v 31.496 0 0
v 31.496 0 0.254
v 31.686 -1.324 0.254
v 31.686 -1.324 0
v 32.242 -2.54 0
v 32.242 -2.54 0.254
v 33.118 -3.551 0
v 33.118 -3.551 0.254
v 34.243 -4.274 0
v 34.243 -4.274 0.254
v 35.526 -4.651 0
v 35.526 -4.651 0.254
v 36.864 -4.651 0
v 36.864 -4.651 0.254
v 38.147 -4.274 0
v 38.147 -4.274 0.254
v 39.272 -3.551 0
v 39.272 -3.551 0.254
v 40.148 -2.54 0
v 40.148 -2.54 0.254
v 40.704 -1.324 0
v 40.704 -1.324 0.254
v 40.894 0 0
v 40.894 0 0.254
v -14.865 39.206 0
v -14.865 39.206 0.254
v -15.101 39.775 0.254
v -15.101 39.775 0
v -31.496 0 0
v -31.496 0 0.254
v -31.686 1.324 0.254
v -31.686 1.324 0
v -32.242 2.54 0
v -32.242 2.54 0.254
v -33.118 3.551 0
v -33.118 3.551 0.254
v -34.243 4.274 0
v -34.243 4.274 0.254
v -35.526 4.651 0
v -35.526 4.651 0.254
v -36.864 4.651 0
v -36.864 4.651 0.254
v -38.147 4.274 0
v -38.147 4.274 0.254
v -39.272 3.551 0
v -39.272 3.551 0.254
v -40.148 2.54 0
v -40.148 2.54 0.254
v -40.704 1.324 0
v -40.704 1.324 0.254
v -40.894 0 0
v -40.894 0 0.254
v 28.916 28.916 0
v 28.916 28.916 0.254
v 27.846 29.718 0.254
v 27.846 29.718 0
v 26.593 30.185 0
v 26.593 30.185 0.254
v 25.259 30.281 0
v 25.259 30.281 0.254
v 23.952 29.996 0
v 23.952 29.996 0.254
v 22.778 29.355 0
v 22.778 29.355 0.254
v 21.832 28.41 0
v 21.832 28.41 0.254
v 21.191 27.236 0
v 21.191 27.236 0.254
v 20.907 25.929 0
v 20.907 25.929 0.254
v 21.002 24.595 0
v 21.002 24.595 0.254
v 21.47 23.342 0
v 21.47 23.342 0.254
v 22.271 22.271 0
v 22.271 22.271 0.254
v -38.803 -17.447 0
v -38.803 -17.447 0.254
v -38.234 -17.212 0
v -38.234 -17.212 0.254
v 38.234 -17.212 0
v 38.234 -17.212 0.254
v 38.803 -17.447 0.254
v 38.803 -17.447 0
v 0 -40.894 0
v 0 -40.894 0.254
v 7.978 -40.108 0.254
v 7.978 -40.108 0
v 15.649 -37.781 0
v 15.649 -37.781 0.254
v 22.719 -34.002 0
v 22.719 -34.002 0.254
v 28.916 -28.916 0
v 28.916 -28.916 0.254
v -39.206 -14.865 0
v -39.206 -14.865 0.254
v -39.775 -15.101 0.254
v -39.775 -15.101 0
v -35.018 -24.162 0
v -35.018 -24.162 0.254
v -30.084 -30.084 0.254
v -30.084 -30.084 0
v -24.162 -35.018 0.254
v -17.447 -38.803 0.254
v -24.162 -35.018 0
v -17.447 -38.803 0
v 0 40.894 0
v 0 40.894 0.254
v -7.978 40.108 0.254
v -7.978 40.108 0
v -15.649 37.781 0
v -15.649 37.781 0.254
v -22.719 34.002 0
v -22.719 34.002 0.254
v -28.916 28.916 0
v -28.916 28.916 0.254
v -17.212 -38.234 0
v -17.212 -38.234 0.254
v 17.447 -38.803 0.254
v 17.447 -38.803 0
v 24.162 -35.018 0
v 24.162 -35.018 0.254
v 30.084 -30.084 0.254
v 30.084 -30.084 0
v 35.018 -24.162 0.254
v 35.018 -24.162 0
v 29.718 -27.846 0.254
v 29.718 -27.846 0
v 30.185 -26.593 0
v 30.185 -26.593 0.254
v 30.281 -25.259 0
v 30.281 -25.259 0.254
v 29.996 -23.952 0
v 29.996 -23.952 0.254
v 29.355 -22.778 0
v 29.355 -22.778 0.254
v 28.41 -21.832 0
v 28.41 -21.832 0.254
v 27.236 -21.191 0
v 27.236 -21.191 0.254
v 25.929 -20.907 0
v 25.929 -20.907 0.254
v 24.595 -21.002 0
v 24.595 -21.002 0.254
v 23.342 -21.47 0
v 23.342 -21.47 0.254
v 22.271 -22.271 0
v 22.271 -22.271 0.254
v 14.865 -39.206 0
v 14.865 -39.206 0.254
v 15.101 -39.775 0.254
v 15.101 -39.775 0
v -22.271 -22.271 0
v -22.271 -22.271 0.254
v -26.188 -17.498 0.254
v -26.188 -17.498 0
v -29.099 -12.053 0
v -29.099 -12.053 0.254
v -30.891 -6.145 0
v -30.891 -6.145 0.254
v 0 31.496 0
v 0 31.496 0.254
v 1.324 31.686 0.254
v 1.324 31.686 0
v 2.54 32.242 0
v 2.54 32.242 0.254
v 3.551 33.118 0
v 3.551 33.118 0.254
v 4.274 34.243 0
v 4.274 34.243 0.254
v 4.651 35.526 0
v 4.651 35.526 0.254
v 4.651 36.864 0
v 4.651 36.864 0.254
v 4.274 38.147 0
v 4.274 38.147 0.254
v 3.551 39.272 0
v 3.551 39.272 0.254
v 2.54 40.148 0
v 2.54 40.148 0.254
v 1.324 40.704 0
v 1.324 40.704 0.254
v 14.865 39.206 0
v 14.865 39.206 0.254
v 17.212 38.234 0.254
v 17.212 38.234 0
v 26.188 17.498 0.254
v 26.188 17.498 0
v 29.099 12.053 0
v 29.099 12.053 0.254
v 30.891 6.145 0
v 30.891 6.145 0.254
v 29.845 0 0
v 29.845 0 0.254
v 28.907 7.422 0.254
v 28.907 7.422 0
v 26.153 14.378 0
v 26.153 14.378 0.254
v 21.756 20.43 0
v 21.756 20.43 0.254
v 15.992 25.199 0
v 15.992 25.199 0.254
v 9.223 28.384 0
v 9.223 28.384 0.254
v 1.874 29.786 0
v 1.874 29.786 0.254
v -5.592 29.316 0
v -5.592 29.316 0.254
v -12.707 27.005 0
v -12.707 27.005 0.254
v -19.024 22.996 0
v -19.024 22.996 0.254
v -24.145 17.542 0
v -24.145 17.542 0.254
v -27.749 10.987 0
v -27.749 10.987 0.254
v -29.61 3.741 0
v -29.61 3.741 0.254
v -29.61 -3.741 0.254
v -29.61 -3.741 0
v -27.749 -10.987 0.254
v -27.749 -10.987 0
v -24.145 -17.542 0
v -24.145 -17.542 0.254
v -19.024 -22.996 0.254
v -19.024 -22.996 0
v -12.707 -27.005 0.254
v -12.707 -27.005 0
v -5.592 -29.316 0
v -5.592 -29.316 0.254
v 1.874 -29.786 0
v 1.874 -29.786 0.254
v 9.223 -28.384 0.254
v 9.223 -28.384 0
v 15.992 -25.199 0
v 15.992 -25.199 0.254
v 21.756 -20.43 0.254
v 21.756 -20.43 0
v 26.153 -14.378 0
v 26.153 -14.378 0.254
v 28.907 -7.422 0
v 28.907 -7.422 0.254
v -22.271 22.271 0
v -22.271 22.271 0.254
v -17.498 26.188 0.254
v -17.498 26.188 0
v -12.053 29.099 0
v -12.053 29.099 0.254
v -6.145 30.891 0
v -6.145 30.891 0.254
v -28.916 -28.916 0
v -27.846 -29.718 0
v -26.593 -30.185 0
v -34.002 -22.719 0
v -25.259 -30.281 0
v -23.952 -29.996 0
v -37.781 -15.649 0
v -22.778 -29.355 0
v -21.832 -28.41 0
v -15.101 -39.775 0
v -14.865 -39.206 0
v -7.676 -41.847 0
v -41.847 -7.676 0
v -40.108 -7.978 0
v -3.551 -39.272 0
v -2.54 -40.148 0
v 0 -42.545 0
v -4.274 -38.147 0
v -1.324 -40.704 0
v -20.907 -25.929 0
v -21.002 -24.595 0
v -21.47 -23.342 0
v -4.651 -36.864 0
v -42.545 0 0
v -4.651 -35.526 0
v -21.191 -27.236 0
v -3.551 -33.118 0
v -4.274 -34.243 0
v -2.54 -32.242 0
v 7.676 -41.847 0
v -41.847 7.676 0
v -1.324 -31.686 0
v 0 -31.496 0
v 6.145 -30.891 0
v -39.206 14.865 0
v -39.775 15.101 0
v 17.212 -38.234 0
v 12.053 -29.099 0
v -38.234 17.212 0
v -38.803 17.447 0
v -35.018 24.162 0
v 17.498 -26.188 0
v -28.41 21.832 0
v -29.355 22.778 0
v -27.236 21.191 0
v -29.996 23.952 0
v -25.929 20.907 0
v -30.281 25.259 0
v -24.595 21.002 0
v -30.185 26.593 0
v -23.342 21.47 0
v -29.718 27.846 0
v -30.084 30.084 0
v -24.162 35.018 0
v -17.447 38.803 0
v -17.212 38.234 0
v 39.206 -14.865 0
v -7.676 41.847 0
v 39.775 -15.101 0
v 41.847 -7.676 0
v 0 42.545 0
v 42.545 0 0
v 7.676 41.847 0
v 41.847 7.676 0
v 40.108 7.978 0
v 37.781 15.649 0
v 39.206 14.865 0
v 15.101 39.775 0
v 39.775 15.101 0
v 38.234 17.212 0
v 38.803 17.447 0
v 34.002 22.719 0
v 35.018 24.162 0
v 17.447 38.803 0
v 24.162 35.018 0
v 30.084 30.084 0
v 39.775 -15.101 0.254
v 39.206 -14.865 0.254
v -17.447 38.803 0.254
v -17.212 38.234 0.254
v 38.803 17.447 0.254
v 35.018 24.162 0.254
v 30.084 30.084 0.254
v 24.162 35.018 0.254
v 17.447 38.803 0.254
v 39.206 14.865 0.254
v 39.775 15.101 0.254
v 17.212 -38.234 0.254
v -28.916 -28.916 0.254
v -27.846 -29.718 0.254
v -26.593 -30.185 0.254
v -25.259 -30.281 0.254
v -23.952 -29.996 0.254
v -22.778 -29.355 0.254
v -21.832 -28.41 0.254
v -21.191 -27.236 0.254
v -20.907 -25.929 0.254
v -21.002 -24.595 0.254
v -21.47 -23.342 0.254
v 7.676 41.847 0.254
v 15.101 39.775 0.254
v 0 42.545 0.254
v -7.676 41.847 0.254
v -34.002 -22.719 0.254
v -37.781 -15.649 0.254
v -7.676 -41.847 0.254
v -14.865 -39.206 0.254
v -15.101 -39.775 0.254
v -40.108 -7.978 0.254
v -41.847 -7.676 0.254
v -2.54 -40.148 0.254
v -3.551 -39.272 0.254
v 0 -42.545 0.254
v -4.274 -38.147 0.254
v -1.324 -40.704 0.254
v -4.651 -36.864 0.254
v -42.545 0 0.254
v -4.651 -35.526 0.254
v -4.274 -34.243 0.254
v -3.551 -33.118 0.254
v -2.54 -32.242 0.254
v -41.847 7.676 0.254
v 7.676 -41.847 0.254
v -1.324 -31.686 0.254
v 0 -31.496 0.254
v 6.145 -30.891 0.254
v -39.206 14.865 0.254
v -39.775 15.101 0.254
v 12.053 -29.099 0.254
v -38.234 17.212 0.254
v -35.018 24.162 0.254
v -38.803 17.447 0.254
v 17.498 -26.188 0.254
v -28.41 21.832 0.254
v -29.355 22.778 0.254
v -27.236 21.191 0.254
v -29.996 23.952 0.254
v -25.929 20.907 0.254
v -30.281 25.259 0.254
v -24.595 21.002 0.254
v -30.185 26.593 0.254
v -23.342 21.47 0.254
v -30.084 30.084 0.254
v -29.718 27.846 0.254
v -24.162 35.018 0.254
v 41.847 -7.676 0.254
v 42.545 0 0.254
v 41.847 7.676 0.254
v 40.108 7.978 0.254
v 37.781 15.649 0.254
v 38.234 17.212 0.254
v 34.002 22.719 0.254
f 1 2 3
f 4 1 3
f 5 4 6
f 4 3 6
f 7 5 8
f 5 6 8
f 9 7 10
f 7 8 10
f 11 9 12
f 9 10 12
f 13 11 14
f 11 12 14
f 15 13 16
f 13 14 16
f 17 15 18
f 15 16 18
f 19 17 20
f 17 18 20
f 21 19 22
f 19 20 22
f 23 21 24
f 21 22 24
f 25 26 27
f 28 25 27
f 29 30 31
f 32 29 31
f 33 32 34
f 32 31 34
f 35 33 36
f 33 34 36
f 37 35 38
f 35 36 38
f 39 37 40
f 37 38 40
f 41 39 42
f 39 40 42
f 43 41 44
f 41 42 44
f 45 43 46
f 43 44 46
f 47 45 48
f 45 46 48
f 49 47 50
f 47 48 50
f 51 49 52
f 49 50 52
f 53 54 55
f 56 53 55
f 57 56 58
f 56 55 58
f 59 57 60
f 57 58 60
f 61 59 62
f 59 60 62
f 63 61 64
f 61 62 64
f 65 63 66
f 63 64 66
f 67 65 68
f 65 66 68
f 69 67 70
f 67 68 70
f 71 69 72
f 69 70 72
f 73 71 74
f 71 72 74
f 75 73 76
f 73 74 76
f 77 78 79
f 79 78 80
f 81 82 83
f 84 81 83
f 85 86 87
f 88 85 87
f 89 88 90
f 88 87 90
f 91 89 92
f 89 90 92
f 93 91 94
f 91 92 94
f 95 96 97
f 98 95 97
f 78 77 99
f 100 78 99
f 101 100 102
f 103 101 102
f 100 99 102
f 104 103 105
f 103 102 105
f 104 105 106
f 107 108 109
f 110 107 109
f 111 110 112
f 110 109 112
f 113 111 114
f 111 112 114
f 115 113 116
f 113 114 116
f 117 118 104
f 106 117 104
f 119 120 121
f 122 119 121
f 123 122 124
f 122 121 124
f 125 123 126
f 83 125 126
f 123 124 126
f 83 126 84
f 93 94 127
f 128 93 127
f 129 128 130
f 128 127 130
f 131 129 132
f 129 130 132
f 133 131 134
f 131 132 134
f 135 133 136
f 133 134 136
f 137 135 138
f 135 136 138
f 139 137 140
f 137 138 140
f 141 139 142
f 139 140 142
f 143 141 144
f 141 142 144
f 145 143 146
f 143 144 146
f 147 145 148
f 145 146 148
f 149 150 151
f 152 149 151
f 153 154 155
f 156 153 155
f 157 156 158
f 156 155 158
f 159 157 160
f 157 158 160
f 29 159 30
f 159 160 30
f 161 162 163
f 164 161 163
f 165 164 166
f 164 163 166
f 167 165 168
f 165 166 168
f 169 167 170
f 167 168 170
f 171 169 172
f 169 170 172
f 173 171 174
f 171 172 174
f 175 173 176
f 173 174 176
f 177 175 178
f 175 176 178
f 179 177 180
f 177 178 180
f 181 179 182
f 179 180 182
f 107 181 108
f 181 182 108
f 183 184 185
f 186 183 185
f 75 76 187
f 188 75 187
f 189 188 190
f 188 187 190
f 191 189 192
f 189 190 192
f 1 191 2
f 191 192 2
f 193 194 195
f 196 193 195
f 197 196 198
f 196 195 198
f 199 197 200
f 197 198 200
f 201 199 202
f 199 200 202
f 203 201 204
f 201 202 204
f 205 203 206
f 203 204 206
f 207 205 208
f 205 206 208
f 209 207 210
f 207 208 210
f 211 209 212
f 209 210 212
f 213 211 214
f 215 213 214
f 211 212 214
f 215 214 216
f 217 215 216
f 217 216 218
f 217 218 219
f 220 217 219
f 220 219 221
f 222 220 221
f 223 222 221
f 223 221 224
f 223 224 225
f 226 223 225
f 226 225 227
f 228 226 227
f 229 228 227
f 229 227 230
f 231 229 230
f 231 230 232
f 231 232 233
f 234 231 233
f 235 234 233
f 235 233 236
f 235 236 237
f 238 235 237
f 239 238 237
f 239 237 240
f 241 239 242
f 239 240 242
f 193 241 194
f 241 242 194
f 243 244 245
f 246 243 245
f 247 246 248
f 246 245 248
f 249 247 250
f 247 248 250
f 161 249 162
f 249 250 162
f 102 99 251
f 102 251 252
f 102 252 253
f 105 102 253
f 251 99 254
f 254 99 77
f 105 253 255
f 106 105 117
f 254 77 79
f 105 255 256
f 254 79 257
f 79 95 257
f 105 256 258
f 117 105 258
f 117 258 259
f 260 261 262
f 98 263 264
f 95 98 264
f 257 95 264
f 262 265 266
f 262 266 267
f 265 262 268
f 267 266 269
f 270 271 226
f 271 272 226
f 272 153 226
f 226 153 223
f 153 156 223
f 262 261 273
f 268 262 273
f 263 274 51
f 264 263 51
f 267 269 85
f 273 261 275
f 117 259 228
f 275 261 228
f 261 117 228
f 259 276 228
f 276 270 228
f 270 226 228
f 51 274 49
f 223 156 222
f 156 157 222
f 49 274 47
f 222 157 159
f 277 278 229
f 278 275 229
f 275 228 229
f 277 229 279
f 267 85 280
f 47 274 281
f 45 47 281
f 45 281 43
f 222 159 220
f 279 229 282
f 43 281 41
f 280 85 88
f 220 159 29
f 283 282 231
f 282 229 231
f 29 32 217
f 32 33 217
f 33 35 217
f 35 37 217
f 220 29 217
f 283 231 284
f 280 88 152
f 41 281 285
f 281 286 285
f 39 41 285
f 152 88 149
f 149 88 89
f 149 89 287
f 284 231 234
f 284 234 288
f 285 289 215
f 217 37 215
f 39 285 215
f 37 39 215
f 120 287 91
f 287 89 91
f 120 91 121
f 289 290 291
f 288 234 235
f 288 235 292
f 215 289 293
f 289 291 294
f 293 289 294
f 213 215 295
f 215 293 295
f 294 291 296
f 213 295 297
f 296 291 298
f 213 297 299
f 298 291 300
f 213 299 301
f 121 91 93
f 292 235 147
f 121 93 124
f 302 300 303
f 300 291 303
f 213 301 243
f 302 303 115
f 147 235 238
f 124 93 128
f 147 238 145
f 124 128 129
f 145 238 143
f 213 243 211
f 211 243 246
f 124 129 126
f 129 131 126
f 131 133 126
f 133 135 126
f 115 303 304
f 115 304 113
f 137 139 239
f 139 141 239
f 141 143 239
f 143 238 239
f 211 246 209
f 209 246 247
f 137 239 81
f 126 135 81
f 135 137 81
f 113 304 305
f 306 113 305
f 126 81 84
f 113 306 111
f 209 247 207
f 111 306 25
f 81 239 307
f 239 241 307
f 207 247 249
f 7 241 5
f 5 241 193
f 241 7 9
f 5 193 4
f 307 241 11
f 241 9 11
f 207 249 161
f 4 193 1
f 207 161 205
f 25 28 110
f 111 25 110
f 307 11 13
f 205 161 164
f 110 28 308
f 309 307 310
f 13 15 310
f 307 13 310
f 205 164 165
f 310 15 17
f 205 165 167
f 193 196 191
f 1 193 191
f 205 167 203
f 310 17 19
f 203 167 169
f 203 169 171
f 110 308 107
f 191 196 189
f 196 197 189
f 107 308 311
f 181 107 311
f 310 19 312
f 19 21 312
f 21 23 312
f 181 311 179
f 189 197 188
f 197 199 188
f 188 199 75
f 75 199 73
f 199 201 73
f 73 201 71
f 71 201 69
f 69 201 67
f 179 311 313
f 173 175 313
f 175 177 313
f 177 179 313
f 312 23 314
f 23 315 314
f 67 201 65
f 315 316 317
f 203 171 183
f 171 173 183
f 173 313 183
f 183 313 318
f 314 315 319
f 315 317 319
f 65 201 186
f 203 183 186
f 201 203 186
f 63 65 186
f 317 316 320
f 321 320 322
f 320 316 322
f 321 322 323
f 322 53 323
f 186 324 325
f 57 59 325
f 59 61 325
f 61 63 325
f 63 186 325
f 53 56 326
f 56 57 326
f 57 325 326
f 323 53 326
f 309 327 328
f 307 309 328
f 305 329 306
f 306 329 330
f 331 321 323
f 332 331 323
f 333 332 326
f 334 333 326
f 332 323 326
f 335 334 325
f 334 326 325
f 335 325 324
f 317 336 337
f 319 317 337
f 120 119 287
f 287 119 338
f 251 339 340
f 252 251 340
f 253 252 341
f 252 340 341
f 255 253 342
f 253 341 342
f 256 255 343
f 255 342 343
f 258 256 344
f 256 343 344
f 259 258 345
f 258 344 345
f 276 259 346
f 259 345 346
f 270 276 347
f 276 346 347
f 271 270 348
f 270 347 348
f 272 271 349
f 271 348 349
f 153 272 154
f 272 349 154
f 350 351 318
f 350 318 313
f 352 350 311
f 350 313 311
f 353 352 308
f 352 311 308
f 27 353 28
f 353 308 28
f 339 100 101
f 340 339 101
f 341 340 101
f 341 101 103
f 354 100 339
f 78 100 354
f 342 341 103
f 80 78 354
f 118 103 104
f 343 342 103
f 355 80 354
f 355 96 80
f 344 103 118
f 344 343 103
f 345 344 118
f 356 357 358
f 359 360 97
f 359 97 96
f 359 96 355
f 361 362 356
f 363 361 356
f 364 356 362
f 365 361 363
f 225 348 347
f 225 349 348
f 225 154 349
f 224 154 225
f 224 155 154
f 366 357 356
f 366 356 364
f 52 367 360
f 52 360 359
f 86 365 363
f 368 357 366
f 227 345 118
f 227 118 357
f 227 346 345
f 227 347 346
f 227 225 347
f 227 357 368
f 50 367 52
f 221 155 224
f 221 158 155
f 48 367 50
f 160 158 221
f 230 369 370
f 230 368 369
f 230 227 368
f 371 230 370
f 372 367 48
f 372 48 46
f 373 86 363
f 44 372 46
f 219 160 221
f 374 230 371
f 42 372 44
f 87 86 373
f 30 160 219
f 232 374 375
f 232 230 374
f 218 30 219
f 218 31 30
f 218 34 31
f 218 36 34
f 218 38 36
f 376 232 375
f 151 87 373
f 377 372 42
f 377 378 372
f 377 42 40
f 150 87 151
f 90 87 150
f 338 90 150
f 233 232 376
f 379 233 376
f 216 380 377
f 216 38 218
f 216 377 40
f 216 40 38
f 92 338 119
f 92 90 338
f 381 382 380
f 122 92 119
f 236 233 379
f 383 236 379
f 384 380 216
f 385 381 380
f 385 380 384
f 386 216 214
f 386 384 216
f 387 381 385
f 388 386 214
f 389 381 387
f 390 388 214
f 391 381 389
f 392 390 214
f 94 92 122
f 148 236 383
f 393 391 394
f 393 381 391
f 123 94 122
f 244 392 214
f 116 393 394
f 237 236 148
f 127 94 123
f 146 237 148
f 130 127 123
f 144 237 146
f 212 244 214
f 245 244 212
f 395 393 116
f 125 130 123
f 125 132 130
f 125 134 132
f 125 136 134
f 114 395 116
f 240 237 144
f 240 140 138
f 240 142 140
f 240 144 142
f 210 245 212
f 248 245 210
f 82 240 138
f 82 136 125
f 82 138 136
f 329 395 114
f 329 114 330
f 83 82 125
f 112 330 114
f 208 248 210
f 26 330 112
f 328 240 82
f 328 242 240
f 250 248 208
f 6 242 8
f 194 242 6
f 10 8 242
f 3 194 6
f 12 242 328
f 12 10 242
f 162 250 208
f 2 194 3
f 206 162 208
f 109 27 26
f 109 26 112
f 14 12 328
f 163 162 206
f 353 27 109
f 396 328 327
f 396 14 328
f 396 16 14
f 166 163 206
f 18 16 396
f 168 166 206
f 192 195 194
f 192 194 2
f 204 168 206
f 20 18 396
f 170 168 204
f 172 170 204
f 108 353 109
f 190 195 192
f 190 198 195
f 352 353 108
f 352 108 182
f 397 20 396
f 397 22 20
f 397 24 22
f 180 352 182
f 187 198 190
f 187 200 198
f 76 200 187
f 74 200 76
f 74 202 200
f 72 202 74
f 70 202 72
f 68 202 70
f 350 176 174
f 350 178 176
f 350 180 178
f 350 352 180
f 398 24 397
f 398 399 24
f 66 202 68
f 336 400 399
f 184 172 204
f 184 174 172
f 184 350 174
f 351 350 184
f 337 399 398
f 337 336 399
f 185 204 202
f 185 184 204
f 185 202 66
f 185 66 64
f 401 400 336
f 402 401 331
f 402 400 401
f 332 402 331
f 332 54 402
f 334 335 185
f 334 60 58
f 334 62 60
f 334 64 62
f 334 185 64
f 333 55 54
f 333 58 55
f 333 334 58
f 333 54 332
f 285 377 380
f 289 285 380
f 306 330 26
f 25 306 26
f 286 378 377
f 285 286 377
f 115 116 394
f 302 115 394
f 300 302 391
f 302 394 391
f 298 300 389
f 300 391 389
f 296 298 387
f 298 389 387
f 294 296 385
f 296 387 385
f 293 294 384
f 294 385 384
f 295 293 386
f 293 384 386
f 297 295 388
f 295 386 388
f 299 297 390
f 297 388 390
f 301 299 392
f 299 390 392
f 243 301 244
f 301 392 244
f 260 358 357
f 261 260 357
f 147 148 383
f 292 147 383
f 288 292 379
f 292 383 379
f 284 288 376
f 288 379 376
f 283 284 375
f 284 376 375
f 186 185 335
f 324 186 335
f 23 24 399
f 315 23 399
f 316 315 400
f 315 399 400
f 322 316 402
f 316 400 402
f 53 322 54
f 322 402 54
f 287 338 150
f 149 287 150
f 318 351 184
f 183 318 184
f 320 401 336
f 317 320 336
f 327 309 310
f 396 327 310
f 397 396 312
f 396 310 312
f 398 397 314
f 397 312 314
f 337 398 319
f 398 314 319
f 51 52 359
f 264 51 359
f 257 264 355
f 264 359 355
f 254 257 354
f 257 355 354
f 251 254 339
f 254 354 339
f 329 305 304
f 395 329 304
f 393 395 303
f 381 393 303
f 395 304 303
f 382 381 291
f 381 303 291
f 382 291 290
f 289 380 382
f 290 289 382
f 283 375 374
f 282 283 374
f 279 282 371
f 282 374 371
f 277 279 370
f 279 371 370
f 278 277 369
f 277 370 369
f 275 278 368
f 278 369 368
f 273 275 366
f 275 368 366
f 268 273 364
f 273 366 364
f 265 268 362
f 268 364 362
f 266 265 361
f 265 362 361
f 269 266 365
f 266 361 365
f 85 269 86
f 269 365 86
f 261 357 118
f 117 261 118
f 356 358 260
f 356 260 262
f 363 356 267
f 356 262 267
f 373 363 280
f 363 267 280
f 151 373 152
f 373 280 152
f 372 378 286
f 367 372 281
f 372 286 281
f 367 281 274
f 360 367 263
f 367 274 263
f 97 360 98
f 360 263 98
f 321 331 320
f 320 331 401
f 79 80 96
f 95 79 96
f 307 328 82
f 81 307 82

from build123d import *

# Parameters (mm, degrees)
SKETCH4_R           = 42.545
BOSS_EXTRUDE2_DEPTH = 0.254
SKETCH5_R           = 29.845
CUT_EXTRUDE5_DEPTH  = 1.254
CUT_EXTRUDE6_DEPTH  = 1.254
CUT_EXTRUDE11_DEPTH = 1.254


with BuildPart() as part:
    # Sketch4 → Boss-Extrude2 (new body)
    with BuildSketch(Plane.XY):
        Circle(SKETCH4_R)
    extrude(amount=BOSS_EXTRUDE2_DEPTH)

    # Sketch5 → Cut-Extrude5 (cut, through all)
    with BuildSketch(Plane.XY.offset(0.254)):
        Circle(SKETCH5_R)
    extrude(amount=-CUT_EXTRUDE5_DEPTH, mode=Mode.SUBTRACT)

    # Sketch6 → Cut-Extrude6 (cut, through all)
    with BuildSketch(Plane.XY.offset(0.254)):
        with BuildLine():
            ThreePointArc((28.916424965, 28.916424455), (22.27103521, 28.916424739), (22.271035377, 22.271034984))
            ThreePointArc((22.271035377, 22.271034984), (29.098509704, 12.052997511), (31.496, 5.5e-07))
            ThreePointArc((31.496, 5.5e-07), (36.195000082, -4.699), (40.894, 7.14e-07))
            ThreePointArc((40.894, 7.14e-07), (37.781129535, 15.649456446), (28.916424965, 28.916424455))
        make_face()
        with BuildLine():
            ThreePointArc((28.916424455, -28.916424965), (28.916424739, -22.27103521), (22.271034984, -22.271035377))
            ThreePointArc((22.271034984, -22.271035377), (12.052997511, -29.098509704), (5.5e-07, -31.496))
            ThreePointArc((5.5e-07, -31.496), (-4.699, -36.195000082), (7.14e-07, -40.894))
            ThreePointArc((7.14e-07, -40.894), (15.649456446, -37.781129535), (28.916424455, -28.916424965))
        make_face()
        with BuildLine():
            ThreePointArc((-28.916424965, -28.916424455), (-22.27103521, -28.916424739), (-22.271035377, -22.271034984))
            ThreePointArc((-22.271035377, -22.271034984), (-29.098509704, -12.052997511), (-31.496, -5.5e-07))
            ThreePointArc((-31.496, -5.5e-07), (-36.195000082, 4.699), (-40.894, -7.14e-07))
            ThreePointArc((-40.894, -7.14e-07), (-37.781129535, -15.649456446), (-28.916424965, -28.916424455))
        make_face()
        with BuildLine():
            ThreePointArc((-28.916424455, 28.916424965), (-28.916424739, 22.27103521), (-22.271034984, 22.271035377))
            ThreePointArc((-22.271034984, 22.271035377), (-12.052997511, 29.098509704), (-5.5e-07, 31.496))
            ThreePointArc((-5.5e-07, 31.496), (4.699, 36.195000082), (-7.14e-07, 40.894))
            ThreePointArc((-7.14e-07, 40.894), (-15.649456446, 37.781129535), (-28.916424455, 28.916424965))
        make_face()
    extrude(amount=-CUT_EXTRUDE6_DEPTH, mode=Mode.SUBTRACT)

    # Sketch8 → Cut-Extrude11 (cut, through all)
    with BuildSketch(Plane.XY.offset(0.254)):
        Polygon((40.379126173, 15.350943603), (39.407110255, 17.697597616), (38.233783248, 17.211589657), (39.205799167, 14.864935644), align=None)
        Polygon((-15.350943603, 40.379126173), (-17.697597616, 39.407110255), (-17.211589657, 38.233783248), (-14.864935644, 39.205799167), align=None)
        Polygon((-39.407110255, 17.697597616), (-40.379126173, 15.350943603), (-39.205799167, 14.864935644), (-38.233783248, 17.211589657), align=None)
        Polygon((-40.379126173, -15.350943603), (-39.407110255, -17.697597616), (-38.233783248, -17.211589657), (-39.205799167, -14.864935644), align=None)
        Polygon((-17.697597616, -39.407110255), (-15.350943603, -40.379126173), (-14.864935644, -39.205799167), (-17.211589657, -38.233783248), align=None)
        Polygon((15.350943603, -40.379126173), (17.697597616, -39.407110255), (17.211589657, -38.233783248), (14.864935644, -39.205799167), align=None)
        Polygon((39.407110255, -17.697597616), (40.379126173, -15.350943603), (39.205799167, -14.864935644), (38.233783248, -17.211589657), align=None)
        Polygon((17.697597616, 39.407110255), (15.350943603, 40.379126173), (14.864935644, 39.205799167), (17.211589657, 38.233783248), align=None)
    extrude(amount=-CUT_EXTRUDE11_DEPTH, mode=Mode.SUBTRACT)


solid = part.part
